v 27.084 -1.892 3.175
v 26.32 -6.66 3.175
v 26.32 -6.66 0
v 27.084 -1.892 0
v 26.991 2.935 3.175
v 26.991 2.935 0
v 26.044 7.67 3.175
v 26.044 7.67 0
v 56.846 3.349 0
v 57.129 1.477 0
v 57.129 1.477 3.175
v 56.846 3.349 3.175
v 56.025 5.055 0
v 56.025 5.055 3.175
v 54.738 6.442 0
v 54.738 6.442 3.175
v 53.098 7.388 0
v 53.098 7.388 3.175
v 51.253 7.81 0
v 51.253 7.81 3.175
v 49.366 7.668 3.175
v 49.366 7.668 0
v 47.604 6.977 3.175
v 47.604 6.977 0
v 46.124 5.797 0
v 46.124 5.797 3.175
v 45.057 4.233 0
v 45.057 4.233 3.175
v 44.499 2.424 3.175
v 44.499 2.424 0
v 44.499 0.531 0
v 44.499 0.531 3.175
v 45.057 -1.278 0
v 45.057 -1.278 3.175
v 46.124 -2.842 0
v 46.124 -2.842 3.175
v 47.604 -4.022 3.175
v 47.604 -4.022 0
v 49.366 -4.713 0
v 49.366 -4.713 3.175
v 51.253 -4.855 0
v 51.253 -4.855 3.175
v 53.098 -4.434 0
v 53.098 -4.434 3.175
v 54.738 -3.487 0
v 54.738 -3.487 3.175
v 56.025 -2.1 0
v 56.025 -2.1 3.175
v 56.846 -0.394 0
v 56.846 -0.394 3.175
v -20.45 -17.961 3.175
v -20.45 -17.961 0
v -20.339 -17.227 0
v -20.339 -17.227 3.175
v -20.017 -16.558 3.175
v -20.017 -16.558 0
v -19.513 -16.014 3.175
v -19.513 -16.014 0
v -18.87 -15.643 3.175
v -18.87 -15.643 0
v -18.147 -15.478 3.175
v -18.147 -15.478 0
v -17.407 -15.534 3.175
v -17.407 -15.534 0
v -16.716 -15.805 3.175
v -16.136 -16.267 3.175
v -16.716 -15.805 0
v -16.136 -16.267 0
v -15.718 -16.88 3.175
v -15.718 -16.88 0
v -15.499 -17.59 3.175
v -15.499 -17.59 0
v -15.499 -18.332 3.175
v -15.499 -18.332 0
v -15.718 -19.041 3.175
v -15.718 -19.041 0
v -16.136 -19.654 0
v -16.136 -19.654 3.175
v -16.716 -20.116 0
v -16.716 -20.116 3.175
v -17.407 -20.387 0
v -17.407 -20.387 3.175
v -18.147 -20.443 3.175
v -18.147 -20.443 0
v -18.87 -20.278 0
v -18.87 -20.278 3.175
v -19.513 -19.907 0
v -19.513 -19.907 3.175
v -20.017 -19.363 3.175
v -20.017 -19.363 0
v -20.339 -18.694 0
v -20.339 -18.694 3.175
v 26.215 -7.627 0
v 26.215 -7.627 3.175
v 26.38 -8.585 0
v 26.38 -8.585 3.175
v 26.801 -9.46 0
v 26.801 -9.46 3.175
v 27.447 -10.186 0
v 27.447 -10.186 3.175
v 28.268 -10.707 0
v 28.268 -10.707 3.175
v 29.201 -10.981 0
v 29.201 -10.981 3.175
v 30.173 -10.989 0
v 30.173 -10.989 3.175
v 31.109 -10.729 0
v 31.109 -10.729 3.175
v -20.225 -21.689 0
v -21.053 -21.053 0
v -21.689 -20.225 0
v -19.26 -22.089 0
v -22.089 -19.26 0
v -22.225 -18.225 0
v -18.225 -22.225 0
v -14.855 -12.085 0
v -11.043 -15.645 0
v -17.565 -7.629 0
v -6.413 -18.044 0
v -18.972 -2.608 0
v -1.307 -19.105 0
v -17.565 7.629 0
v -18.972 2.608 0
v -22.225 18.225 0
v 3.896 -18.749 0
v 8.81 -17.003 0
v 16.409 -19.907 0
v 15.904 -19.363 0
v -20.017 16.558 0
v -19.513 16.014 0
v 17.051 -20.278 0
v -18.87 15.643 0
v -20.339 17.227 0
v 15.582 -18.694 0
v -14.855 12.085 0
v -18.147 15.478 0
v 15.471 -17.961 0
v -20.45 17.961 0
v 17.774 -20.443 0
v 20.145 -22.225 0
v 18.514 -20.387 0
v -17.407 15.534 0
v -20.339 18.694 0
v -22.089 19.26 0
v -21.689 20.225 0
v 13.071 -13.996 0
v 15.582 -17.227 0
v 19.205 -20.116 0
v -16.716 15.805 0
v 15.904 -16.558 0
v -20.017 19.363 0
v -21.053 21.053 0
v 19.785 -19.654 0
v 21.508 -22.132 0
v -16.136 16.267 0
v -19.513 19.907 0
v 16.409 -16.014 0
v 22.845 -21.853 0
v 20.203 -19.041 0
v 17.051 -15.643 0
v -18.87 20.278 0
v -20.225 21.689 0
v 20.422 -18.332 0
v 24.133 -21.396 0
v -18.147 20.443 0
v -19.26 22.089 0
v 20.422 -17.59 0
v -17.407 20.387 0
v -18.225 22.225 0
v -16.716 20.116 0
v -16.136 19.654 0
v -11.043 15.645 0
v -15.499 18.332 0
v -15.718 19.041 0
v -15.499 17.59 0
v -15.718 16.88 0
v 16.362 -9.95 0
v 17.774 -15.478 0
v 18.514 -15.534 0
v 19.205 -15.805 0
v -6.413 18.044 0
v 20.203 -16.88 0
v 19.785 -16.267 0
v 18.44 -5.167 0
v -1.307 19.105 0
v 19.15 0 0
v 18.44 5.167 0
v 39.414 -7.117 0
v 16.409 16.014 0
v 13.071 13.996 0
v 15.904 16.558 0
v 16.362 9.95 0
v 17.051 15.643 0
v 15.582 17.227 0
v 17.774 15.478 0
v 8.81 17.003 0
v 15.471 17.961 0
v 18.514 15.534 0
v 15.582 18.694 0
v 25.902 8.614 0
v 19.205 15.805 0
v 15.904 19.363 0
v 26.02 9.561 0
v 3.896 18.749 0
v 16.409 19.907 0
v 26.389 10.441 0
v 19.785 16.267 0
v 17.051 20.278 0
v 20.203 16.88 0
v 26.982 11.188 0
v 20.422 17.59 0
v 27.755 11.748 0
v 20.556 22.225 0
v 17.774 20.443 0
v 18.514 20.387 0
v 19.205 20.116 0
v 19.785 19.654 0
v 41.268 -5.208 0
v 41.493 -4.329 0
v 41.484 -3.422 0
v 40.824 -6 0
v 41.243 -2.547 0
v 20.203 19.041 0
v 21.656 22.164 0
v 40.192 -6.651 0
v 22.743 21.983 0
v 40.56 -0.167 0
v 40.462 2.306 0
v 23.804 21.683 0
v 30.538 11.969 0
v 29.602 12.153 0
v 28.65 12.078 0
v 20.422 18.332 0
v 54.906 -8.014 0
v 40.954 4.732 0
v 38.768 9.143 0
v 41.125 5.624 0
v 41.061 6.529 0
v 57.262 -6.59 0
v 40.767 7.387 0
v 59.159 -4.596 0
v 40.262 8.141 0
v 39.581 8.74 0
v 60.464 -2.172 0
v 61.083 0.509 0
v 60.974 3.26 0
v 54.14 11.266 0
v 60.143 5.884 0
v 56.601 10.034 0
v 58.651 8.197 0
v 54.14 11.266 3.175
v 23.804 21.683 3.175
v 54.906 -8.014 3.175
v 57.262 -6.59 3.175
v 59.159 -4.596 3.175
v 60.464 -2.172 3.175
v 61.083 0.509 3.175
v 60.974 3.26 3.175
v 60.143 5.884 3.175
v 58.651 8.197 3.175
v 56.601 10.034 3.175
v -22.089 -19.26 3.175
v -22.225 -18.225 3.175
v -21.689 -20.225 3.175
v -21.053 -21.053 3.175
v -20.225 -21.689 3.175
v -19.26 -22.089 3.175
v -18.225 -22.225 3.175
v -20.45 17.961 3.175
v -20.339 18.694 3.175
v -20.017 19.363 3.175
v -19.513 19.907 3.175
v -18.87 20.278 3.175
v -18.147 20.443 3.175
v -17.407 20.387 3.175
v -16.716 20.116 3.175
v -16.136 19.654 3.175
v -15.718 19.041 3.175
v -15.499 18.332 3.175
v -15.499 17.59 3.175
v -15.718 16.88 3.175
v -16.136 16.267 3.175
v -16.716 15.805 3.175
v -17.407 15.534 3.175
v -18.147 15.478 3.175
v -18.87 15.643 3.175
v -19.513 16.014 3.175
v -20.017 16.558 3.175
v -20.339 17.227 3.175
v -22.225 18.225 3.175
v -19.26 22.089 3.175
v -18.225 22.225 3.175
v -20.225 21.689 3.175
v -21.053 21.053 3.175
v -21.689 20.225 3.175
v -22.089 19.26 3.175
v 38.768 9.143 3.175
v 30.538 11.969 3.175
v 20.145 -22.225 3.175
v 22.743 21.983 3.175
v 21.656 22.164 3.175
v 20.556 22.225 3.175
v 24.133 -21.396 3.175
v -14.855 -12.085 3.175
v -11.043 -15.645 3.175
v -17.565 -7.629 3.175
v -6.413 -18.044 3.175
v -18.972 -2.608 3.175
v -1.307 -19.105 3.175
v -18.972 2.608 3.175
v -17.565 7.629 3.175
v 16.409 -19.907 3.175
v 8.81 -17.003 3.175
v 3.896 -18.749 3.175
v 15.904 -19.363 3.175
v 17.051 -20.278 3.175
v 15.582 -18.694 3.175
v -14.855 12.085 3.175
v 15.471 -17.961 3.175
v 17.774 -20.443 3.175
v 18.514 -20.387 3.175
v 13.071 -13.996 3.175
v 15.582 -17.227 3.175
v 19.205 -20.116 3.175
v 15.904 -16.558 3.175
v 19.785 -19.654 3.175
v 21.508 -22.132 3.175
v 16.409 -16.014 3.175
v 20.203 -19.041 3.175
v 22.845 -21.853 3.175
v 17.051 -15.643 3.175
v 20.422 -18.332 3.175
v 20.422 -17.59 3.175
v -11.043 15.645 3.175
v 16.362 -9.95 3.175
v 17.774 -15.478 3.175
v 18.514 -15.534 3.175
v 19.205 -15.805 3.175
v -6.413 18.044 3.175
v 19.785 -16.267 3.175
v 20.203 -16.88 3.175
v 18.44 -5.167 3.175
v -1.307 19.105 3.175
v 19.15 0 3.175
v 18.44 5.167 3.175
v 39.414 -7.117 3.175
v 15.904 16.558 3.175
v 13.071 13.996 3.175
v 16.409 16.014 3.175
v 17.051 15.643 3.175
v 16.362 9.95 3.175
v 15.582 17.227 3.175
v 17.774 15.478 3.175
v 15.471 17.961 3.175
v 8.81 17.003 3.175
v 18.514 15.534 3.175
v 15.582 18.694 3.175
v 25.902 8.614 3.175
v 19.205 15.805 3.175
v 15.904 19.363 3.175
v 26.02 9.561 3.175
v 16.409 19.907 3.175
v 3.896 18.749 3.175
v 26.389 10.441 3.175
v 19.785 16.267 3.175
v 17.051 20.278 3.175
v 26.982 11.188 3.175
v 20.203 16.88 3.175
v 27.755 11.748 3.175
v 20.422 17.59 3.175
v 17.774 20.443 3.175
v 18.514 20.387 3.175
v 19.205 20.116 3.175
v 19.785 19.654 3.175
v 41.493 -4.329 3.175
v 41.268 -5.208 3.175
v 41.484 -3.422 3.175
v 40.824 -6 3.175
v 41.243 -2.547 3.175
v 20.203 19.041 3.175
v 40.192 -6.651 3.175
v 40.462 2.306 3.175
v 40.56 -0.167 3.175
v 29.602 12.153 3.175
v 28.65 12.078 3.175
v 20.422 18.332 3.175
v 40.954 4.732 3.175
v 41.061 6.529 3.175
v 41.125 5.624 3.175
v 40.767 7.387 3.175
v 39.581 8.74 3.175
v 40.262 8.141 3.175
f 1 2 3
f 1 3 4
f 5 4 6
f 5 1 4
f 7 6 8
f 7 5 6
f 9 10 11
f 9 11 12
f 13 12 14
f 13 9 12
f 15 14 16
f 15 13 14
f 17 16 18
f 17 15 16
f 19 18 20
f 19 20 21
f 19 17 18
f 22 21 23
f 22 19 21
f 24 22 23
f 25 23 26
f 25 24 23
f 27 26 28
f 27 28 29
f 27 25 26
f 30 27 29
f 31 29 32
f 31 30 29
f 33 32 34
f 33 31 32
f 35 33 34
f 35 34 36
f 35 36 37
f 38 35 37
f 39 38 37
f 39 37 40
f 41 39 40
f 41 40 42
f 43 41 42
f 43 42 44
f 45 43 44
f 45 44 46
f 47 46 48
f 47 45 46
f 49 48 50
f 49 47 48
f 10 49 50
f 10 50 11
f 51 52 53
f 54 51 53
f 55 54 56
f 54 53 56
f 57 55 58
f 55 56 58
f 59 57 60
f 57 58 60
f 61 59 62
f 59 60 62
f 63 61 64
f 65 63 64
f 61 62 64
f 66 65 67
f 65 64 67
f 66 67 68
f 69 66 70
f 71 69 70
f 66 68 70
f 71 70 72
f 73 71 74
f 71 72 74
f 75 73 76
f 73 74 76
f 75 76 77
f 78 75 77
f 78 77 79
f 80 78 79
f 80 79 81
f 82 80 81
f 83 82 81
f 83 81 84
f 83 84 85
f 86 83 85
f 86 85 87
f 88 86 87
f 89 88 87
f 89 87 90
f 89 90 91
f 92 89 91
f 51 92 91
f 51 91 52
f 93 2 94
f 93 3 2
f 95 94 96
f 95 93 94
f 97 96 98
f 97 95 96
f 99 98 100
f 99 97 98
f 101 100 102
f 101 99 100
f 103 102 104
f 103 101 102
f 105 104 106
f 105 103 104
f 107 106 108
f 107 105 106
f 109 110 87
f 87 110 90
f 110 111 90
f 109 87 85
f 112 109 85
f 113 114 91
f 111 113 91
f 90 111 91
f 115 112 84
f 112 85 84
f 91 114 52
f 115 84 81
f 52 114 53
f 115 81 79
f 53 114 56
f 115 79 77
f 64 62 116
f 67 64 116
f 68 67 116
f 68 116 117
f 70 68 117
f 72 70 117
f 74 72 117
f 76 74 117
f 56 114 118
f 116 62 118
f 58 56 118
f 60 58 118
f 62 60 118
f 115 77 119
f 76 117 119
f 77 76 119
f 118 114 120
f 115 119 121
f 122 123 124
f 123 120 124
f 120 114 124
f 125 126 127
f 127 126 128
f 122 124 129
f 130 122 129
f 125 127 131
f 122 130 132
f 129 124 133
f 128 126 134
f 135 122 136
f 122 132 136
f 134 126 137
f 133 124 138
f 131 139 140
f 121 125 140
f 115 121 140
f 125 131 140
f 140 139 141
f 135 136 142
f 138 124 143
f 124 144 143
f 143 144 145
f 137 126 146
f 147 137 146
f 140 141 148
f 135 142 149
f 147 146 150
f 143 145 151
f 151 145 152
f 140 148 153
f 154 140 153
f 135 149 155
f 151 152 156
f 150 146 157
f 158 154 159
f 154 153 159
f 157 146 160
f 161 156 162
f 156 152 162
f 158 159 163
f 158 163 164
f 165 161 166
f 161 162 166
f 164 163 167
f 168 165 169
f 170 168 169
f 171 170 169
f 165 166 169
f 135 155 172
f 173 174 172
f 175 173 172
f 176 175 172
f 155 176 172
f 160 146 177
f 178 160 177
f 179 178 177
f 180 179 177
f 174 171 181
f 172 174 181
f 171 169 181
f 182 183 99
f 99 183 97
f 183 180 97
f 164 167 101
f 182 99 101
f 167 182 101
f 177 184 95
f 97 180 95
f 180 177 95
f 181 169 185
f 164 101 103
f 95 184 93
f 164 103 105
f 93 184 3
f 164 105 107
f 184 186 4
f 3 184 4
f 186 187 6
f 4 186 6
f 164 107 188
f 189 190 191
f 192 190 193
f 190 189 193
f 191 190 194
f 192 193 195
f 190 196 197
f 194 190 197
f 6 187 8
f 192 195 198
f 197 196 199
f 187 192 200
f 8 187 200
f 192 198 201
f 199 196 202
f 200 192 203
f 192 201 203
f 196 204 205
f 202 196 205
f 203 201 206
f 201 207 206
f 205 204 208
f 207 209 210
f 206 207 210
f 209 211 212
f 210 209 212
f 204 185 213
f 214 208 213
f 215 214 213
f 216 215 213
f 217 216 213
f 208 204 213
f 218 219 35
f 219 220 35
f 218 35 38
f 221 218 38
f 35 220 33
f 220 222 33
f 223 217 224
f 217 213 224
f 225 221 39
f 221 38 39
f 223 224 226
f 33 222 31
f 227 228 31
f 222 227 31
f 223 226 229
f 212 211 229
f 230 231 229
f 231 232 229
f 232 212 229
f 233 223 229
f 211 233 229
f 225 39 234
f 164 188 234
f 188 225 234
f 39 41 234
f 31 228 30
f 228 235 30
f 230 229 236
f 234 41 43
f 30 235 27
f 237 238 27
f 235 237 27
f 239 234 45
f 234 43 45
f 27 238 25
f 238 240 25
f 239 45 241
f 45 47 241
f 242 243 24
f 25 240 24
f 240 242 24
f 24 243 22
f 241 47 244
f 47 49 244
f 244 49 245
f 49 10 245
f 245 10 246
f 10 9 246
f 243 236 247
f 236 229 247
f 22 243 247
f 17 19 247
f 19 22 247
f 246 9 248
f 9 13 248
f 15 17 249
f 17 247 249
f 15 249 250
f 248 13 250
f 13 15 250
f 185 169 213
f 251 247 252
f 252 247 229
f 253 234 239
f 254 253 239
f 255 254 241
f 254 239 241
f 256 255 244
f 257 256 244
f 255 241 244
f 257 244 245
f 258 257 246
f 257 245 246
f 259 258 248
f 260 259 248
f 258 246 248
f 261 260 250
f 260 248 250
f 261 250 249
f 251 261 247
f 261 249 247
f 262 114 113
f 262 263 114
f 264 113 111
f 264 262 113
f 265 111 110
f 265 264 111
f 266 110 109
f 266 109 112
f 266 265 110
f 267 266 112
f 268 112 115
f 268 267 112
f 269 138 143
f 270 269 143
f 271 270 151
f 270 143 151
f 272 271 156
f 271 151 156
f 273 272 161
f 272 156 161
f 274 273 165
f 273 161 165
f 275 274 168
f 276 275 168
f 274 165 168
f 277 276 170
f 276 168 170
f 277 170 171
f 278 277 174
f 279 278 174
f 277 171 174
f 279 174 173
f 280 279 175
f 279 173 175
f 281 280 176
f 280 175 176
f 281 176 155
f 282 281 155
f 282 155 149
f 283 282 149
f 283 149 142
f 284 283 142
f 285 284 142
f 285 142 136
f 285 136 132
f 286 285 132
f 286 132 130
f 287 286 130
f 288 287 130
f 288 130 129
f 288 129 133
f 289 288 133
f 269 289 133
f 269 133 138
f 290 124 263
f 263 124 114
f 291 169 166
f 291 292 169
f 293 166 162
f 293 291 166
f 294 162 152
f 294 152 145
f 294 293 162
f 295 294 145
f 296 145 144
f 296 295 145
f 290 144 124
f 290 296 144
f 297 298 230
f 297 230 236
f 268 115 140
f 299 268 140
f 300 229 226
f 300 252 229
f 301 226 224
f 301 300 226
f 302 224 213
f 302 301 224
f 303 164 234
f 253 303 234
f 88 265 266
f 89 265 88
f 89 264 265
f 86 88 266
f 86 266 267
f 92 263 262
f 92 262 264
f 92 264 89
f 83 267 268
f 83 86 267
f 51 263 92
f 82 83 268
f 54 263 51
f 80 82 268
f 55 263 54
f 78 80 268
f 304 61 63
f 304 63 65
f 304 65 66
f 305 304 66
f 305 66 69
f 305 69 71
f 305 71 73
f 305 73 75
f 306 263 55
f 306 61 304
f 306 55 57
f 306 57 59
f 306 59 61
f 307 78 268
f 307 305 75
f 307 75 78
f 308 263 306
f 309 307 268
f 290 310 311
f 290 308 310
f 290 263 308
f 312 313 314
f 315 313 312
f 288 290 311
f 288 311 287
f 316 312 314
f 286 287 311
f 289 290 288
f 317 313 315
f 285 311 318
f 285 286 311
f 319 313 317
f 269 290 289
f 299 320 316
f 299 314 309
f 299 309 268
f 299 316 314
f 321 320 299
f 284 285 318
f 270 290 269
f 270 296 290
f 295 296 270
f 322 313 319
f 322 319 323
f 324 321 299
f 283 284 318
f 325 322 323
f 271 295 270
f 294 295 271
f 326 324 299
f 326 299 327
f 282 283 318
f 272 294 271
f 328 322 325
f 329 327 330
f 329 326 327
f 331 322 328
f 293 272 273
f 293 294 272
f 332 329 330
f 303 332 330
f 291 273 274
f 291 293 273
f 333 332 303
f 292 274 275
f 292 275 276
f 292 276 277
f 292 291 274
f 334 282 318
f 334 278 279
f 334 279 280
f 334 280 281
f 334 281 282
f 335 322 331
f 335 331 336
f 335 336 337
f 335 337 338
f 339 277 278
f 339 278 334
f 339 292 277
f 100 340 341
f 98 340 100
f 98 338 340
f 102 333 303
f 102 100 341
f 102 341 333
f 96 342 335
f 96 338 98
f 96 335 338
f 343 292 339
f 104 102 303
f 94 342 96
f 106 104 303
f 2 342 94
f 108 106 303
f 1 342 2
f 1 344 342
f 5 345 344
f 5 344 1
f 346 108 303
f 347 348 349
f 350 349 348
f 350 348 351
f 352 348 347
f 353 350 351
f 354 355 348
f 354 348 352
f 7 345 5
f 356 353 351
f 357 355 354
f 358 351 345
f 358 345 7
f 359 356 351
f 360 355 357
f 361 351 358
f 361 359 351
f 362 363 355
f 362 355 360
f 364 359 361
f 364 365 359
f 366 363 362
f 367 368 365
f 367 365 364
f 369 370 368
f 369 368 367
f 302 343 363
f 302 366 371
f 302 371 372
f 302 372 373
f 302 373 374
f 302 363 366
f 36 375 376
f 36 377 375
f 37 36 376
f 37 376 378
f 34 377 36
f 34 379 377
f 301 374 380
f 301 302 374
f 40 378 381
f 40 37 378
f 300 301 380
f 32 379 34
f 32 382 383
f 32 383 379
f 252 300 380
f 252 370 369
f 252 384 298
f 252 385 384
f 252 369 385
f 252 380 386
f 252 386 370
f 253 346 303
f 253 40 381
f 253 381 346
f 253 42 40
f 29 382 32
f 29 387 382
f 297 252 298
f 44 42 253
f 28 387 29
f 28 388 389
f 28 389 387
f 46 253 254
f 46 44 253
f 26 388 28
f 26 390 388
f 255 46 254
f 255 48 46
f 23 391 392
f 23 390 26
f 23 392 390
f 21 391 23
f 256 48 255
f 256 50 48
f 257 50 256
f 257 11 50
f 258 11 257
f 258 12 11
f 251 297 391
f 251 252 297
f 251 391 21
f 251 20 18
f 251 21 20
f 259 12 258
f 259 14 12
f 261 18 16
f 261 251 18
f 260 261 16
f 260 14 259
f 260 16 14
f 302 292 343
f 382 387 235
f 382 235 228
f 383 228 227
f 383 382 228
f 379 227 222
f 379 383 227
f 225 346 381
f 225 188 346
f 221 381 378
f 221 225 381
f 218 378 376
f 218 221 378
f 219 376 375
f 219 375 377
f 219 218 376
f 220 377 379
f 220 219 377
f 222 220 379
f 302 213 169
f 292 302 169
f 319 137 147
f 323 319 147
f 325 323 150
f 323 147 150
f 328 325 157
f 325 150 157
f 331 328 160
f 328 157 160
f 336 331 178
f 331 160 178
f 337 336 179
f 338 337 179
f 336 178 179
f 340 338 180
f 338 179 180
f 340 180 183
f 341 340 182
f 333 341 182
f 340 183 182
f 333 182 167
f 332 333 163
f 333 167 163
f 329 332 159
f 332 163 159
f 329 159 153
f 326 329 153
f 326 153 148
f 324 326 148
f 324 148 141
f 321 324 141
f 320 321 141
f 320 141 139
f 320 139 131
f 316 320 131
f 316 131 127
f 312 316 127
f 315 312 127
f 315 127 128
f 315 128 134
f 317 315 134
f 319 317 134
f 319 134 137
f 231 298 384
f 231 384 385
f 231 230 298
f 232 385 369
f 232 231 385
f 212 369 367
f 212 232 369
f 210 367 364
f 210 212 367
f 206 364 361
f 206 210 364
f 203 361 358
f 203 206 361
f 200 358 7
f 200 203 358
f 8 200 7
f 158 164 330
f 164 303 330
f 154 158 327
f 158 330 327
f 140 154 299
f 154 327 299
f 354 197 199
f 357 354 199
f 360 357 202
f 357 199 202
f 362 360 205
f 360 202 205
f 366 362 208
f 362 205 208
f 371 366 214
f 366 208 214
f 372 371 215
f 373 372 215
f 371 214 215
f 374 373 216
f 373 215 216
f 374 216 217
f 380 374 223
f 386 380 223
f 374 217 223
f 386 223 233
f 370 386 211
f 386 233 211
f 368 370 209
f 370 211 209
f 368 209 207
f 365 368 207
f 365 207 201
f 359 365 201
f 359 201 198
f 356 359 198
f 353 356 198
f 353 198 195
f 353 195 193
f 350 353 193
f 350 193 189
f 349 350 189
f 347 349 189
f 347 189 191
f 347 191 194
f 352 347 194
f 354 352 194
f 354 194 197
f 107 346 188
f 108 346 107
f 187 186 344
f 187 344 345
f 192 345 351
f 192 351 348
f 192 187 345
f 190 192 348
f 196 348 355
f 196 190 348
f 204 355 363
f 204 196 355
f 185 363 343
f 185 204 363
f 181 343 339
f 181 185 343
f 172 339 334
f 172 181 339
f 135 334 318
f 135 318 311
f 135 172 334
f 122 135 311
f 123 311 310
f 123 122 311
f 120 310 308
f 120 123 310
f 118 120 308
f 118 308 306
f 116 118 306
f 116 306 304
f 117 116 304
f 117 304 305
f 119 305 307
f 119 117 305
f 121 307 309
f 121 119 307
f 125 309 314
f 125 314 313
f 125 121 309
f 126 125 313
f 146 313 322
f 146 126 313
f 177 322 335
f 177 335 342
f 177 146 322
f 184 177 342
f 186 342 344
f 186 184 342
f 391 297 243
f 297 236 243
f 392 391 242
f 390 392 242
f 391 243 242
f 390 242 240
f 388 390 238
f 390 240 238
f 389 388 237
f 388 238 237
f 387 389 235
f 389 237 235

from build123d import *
from OCP.BRepFilletAPI import BRepFilletAPI_MakeFillet

# Parameters (mm, degrees)
SKETCH1_R              = 19.15
SKETCH1_R_2            = 6.35
BOSS_EXTRUDE1_DEPTH    = 3.175
F_10_CLEARANCE_HOLE1_D = 4.9784
FILLET1_R1             = 4
FILLET1_R2             = 10
CUT_EXTRUDE1_DEPTH     = 66.12085781
FILLET2_R              = 3.5


with BuildPart() as part:
    # Sketch1 → Boss-Extrude1 (new body)
    with BuildSketch(Plane.XY):
        with BuildLine():
            Line((54.139758885, 11.266432616), (22.225, 22.225))
            Line((22.225, 22.225), (-22.225, 22.225))
            Line((-22.225, 22.225), (-22.225, -22.225))
            Line((-22.225, -22.225), (22.225, -22.225))
            Line((22.225, -22.225), (54.905795434, -8.01403813))
            ThreePointArc((54.905795434, -8.01403813), (61.120351683, 1.888326902), (54.139758885, 11.266432616))
        make_face()
        Circle(SKETCH1_R, mode=Mode.SUBTRACT)
        with Locations((50.778511122, 1.477433)):
            Circle(SKETCH1_R_2, mode=Mode.SUBTRACT)
    extrude(amount=BOSS_EXTRUDE1_DEPTH)

    # #10 Clearance Hole1 (through all)
    with Locations(Plane.XY.offset(3.175)):
        with Locations((-17.960512242, 17.960512242), (17.960512242, 17.960512242), (17.960512242, -17.960512242), (-17.960512242, -17.960512242)):
            Hole(F_10_CLEARANCE_HOLE1_D / 2)

    # Fillet1: one fillet with a radius per group of edges: ONE call of the kernel's fillet builder (fillet() takes one radius for all edges)
    fillet1_edges_1 = [part.edges().sort_by_distance(p)[0] for p in [
        (-22.225, 22.225, 1.5875),
        (-22.225, -22.225, 1.5875),
    ]]
    fillet1_edges_2 = [part.edges().sort_by_distance(p)[0] for p in [
        (22.225, 22.225, 1.5875),
        (22.225, -22.225, 1.5875),
    ]]
    fillet1 = BRepFilletAPI_MakeFillet(part.part.solid().wrapped)
    for e in fillet1_edges_1:
        fillet1.Add(FILLET1_R1, e.wrapped)
    for e in fillet1_edges_2:
        fillet1.Add(FILLET1_R2, e.wrapped)
    add(Compound.cast(fillet1.Shape()), mode=Mode.REPLACE)

    # Sketch5 → Cut-Extrude1 (cut, through all)
    with BuildSketch(Plane.XY.offset(3.175)):
        with BuildLine():
            ThreePointArc((27.15, 0), (26.129764539, -7.37278137), (23.145734428, -14.191457916))
            Line((23.145734428, -14.191457916), (43.133854728, -5.499796294))
            ThreePointArc((43.133854728, -5.499796294), (40.43667056, 1.066539098), (42.604398146, 7.82616335))
            Line((42.604398146, 7.82616335), (22.893969402, 14.594131184))
            ThreePointArc((22.893969402, 14.594131184), (26.064283697, 7.601027257), (27.15, 0))
        make_face()
    extrude(amount=-CUT_EXTRUDE1_DEPTH, mode=Mode.SUBTRACT)

    # Fillet2
    fillet2_edges = [part.edges().sort_by_distance(p)[0] for p in [
        (43.133854728, -5.499796294, 1.5875),
        (23.145734428, -14.191457916, 1.5875),
        (42.604398146, 7.82616335, 1.5875),
        (22.893969402, 14.594131184, 1.5875),
    ]]
    fillet(fillet2_edges, radius=FILLET2_R)


solid = part.part
